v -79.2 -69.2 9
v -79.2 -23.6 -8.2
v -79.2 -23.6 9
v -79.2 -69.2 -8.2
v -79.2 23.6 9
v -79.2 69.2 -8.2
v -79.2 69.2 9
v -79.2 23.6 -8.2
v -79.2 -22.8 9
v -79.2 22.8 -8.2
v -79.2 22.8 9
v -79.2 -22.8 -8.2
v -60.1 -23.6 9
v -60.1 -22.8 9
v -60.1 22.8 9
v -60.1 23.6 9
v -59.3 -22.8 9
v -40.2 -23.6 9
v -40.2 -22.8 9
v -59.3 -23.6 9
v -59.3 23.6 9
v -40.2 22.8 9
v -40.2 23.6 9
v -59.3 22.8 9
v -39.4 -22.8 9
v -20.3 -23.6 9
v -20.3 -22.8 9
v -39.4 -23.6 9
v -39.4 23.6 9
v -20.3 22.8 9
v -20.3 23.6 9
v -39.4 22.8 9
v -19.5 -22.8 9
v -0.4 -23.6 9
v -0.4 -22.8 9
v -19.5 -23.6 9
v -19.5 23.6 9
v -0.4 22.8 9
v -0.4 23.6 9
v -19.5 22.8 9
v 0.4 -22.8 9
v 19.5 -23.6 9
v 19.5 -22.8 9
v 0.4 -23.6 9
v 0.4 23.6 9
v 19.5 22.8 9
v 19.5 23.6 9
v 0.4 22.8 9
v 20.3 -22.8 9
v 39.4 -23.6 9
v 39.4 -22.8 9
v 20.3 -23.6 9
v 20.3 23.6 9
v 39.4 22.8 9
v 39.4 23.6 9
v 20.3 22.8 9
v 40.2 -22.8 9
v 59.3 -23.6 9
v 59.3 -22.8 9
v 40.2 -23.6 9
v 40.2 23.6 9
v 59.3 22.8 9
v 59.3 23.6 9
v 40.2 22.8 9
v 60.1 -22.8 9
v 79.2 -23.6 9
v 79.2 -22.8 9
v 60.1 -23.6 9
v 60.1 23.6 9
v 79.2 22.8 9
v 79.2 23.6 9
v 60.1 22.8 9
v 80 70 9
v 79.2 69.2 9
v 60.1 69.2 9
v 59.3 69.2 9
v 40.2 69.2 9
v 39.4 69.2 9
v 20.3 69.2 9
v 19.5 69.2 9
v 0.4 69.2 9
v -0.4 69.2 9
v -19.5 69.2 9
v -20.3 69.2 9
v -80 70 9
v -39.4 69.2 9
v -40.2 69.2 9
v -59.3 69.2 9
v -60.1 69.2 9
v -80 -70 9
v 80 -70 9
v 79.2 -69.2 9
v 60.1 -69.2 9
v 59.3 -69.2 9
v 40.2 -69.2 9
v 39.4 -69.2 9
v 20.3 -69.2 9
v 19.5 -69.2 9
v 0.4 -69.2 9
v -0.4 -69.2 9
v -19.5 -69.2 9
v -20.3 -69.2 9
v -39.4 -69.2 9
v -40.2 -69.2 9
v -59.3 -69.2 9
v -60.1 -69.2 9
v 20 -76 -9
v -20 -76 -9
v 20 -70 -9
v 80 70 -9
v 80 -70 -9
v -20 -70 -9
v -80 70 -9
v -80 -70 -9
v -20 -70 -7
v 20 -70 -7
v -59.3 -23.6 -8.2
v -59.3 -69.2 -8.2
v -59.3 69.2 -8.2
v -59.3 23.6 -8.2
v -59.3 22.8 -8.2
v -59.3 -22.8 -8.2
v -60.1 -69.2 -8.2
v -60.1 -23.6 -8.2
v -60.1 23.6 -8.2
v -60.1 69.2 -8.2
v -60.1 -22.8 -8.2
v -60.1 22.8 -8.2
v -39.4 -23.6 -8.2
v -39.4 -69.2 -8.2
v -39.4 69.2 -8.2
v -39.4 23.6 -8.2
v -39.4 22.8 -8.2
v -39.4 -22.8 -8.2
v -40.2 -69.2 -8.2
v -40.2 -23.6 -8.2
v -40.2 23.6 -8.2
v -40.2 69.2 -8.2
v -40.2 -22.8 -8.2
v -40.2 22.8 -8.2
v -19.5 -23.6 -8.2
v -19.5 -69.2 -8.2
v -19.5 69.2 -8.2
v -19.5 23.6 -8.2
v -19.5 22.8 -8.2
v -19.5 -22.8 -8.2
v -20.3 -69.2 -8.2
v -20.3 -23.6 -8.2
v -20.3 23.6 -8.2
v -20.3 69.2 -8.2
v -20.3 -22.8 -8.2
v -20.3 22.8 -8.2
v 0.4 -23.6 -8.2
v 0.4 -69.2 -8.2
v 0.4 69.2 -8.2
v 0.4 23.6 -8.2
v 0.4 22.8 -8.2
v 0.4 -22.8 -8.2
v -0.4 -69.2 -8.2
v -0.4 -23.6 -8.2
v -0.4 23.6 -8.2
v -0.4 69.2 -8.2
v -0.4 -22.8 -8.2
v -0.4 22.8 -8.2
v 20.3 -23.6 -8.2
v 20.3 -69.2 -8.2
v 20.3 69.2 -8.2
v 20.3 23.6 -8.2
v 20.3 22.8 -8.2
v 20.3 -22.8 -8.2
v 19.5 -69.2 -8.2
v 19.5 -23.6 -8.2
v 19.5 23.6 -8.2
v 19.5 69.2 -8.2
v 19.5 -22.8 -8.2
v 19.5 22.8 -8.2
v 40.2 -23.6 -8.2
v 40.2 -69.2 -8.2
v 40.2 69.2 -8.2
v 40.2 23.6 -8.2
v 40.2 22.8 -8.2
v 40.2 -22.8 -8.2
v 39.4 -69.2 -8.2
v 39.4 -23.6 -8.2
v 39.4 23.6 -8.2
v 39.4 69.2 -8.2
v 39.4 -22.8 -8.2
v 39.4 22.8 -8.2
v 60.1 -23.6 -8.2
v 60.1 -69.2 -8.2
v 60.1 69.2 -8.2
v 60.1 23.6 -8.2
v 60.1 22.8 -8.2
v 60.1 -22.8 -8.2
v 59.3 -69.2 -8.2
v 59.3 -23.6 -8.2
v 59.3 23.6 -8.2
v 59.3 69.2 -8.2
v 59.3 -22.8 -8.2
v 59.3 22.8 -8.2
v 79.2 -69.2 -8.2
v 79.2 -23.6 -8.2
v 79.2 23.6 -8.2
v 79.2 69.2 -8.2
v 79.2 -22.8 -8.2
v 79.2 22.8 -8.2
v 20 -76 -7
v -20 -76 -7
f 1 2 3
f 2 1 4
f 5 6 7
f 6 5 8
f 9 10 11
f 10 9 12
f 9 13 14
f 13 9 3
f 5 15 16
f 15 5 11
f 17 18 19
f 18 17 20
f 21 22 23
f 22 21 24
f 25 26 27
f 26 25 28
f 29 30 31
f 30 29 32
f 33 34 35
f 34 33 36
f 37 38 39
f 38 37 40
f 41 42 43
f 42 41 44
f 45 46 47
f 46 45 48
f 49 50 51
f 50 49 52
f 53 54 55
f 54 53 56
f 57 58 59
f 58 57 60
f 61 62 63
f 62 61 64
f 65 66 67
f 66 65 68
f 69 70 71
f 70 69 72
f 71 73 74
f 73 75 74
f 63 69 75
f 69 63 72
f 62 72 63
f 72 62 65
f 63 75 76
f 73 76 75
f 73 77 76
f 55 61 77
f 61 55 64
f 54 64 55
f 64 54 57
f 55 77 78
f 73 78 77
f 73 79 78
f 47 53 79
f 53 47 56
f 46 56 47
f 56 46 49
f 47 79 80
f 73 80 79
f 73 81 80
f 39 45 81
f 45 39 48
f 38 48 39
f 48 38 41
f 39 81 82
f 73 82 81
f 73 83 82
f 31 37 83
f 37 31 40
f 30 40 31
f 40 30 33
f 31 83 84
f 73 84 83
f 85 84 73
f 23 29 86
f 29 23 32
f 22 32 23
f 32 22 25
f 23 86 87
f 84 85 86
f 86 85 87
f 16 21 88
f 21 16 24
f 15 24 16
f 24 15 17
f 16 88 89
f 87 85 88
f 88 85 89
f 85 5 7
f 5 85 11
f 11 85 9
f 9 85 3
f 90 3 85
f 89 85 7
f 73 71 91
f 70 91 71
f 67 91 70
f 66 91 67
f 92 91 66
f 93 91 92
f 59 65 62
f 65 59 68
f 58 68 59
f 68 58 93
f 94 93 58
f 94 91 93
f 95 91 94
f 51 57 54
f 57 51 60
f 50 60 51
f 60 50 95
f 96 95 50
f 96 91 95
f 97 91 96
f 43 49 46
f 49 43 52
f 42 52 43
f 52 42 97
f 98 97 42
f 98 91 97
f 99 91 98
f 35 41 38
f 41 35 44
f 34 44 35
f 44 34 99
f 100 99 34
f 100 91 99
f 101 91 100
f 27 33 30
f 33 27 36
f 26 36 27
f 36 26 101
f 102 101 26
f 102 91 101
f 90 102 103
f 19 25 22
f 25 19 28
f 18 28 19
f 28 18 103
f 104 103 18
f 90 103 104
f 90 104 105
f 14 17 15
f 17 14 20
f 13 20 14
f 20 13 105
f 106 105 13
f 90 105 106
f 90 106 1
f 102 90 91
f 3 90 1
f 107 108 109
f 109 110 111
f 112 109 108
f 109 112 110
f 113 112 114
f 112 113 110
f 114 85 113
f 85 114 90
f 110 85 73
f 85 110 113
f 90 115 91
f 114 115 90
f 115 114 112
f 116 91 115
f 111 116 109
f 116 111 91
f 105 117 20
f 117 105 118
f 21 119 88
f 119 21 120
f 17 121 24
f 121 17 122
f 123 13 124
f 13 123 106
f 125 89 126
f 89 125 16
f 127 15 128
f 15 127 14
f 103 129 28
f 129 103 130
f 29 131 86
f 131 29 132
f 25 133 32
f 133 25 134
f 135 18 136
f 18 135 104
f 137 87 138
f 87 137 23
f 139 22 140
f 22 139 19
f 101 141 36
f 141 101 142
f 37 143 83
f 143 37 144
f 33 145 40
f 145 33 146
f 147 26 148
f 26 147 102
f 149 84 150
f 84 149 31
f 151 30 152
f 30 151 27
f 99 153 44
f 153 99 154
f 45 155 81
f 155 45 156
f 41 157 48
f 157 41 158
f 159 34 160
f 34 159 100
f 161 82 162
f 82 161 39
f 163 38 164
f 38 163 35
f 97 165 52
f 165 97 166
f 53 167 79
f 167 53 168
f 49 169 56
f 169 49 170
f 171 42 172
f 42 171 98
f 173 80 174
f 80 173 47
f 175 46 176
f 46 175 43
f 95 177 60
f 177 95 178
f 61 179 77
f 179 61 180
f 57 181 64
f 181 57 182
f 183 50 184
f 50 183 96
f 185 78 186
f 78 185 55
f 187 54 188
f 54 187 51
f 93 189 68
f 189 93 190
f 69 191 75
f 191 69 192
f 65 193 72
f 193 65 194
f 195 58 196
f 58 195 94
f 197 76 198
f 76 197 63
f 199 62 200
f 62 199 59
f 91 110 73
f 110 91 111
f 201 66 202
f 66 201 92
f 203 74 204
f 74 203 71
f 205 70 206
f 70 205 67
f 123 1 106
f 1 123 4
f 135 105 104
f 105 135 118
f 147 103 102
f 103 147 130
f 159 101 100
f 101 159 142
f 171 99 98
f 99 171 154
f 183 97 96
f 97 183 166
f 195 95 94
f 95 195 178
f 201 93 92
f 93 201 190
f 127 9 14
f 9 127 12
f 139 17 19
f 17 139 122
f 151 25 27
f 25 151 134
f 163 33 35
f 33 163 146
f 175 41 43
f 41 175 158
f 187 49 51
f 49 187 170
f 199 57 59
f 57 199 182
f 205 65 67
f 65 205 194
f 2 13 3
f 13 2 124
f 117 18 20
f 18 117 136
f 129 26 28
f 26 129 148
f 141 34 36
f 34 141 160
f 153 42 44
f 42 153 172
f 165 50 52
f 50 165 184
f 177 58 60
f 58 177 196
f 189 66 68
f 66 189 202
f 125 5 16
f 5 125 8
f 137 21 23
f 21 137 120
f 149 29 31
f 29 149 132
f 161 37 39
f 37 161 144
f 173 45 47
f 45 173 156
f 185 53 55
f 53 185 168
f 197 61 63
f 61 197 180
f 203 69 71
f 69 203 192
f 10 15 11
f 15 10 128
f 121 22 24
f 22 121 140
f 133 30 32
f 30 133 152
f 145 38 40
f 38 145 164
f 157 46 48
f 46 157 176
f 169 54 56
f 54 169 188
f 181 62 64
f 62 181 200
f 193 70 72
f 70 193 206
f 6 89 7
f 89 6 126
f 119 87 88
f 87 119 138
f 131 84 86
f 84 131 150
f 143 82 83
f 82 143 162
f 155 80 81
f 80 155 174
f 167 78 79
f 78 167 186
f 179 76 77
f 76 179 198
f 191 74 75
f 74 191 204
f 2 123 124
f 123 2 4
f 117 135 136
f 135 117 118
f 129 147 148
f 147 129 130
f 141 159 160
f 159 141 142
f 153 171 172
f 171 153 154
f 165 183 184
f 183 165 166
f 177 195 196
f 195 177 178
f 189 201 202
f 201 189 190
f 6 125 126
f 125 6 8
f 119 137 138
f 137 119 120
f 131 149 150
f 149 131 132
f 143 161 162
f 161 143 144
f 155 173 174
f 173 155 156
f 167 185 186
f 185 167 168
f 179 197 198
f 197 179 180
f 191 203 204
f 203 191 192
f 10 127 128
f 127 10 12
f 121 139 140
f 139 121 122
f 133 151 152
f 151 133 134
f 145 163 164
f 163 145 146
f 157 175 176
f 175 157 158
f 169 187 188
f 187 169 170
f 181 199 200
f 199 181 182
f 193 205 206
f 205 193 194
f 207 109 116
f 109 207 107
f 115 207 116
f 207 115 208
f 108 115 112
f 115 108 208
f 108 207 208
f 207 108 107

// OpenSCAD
/**** https://www.thingiverse.com/thing:2797727 ****/
/**** author: Svenny                            ****/

/* [Drawer] */
width = 160;
length = 140;
height = 18;
wall_thickness = 0.8;

/* [Cells] */
cells_x = 8; // [1:30]
cells_y = 3; // [1:30]
// see manual!
merged_cells = [];

thickness = wall_thickness;

module organizer_drawer(w, l, h, x_count, y_count, merged=[]) {
    cell_cube = [(w-thickness)/x_count-thickness,
                 (l-thickness)/y_count-thickness,
                 h];
    
    merge_base = [-(w-2*thickness-cell_cube[0])/2,
                 -(l-2*thickness-cell_cube[1])/2,
                 thickness];
    
    difference() {
        union() {
            translate([0,0,(thickness-h)/2])
            cube([w, l, thickness], center=true);
            
            for(x=[-(w-thickness)/2:(w-thickness)/x_count:(w-thickness)/2+1])
                translate([x, 0, 0])
                cube([thickness, l, h], center=true);
            
            for(y=[-(l-thickness)/2:(l-thickness)/y_count:(l-thickness)/2+1])
                translate([0, y, 0])
                cube([w, thickness, h], center=true);
        }
        
        for(m=merged) {
            hull() {
                for(x=[m[0][0], m[1][0]])
                    for(y=[m[0][1], m[1][1]])
                        translate(merge_base 
                            +[x*(cell_cube[0]+thickness), y*(cell_cube[1]+thickness), 0])
                        cube(cell_cube, center=true);
            }
        }
    }
    
    
    // handle
    translate([0, -l/2-3, -h/2+1])
    cube([40, 6, 2], center=true);
}

organizer_drawer(width, length, height, cells_x, cells_y, merged_cells);
